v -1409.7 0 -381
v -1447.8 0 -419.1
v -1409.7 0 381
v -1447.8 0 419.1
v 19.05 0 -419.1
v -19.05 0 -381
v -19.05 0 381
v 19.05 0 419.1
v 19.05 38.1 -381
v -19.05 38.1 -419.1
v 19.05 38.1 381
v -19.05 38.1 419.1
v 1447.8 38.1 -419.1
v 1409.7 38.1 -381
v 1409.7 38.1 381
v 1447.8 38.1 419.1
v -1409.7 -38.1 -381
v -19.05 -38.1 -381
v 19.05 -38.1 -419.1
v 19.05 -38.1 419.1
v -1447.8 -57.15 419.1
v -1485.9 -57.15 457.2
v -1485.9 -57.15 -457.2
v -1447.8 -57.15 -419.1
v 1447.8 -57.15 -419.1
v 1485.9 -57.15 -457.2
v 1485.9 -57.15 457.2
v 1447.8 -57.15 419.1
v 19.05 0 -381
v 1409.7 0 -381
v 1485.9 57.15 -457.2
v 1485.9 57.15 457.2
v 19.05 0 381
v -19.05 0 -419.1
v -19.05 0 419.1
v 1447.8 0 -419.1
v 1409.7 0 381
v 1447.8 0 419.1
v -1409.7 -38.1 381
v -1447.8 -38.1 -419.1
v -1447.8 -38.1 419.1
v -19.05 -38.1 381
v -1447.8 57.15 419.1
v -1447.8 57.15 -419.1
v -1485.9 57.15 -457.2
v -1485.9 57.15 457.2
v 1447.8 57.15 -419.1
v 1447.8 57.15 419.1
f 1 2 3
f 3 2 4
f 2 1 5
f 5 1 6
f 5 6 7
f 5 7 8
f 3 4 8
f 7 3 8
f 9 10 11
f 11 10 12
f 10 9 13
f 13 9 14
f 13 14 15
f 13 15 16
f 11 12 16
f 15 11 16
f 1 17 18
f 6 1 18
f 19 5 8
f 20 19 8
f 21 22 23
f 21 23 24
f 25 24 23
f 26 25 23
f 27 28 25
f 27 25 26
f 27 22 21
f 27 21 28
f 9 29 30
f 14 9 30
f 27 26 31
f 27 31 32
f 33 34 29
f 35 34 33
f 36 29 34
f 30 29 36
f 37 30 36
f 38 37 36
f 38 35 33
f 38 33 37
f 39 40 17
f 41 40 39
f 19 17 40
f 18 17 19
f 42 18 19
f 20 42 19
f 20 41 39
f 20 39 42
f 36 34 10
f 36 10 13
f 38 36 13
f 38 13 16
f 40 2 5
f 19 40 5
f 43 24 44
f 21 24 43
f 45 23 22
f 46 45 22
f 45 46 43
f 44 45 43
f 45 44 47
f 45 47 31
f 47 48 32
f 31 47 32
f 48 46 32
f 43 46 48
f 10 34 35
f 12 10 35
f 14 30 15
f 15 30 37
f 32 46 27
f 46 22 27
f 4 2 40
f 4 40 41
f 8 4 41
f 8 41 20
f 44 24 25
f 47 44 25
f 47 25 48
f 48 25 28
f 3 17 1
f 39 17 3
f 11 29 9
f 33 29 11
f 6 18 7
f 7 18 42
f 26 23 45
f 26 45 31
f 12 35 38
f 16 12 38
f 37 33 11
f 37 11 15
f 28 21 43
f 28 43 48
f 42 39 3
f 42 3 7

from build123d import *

# Parameters (mm, degrees)
F0_W      = 2971.8
F0_H      = 914.4
F1_DEPTH  = 57.15
F2_W      = 2895.6
F2_H      = 838.2
F3_DEPTH  = 114.301
F4_W      = 1466.85
F4_H      = 838.2
F5_DEPTH  = 38.1
F6_W      = 1390.65
F6_H      = 762
F7_DEPTH  = 95.251
F8_W      = 1466.85
F8_H      = 838.2
F9_DEPTH  = 38.1
F10_W     = 1390.65
F10_H     = 762
F11_DEPTH = 57.151


with BuildPart() as f1:
    # F0 (on Front) → F1 (new body, symmetric)
    with BuildSketch(Plane.XZ):
        Rectangle(F0_W, F0_H)
    extrude(amount=F1_DEPTH, both=True)

    # F2 (on face) → F3 (cut, through all)
    with BuildSketch(Plane.XZ.offset(57.15)):
        Rectangle(F2_W, F2_H)
    extrude(amount=-F3_DEPTH, mode=Mode.SUBTRACT)


with BuildPart() as f5:
    # F4 (on Front) → F5 (new body)
    with BuildSketch(Plane.XZ):
        with Locations((-714.375, 0)):
            Rectangle(F4_W, F4_H)
    extrude(amount=F5_DEPTH)

    # F6 (on face) → F7 (cut, through all)
    with BuildSketch(Plane.XZ.offset(38.1)):
        with Locations((-714.375, 0)):
            Rectangle(F6_W, F6_H)
    extrude(amount=-F7_DEPTH, mode=Mode.SUBTRACT)


with BuildPart() as f9:
    # F8 (on Front) → F9 (new body)
    with BuildSketch(Plane.XZ):
        with Locations((714.375, 0)):
            Rectangle(F8_W, F8_H)
    extrude(amount=-F9_DEPTH)

    # F10 (on face) → F11 (cut, through all)
    with BuildSketch(Plane.XZ):
        with Locations((714.375, 0)):
            Rectangle(F10_W, F10_H)
    extrude(amount=-F11_DEPTH, mode=Mode.SUBTRACT)


solid = Compound([f1.part, f5.part, f9.part])
